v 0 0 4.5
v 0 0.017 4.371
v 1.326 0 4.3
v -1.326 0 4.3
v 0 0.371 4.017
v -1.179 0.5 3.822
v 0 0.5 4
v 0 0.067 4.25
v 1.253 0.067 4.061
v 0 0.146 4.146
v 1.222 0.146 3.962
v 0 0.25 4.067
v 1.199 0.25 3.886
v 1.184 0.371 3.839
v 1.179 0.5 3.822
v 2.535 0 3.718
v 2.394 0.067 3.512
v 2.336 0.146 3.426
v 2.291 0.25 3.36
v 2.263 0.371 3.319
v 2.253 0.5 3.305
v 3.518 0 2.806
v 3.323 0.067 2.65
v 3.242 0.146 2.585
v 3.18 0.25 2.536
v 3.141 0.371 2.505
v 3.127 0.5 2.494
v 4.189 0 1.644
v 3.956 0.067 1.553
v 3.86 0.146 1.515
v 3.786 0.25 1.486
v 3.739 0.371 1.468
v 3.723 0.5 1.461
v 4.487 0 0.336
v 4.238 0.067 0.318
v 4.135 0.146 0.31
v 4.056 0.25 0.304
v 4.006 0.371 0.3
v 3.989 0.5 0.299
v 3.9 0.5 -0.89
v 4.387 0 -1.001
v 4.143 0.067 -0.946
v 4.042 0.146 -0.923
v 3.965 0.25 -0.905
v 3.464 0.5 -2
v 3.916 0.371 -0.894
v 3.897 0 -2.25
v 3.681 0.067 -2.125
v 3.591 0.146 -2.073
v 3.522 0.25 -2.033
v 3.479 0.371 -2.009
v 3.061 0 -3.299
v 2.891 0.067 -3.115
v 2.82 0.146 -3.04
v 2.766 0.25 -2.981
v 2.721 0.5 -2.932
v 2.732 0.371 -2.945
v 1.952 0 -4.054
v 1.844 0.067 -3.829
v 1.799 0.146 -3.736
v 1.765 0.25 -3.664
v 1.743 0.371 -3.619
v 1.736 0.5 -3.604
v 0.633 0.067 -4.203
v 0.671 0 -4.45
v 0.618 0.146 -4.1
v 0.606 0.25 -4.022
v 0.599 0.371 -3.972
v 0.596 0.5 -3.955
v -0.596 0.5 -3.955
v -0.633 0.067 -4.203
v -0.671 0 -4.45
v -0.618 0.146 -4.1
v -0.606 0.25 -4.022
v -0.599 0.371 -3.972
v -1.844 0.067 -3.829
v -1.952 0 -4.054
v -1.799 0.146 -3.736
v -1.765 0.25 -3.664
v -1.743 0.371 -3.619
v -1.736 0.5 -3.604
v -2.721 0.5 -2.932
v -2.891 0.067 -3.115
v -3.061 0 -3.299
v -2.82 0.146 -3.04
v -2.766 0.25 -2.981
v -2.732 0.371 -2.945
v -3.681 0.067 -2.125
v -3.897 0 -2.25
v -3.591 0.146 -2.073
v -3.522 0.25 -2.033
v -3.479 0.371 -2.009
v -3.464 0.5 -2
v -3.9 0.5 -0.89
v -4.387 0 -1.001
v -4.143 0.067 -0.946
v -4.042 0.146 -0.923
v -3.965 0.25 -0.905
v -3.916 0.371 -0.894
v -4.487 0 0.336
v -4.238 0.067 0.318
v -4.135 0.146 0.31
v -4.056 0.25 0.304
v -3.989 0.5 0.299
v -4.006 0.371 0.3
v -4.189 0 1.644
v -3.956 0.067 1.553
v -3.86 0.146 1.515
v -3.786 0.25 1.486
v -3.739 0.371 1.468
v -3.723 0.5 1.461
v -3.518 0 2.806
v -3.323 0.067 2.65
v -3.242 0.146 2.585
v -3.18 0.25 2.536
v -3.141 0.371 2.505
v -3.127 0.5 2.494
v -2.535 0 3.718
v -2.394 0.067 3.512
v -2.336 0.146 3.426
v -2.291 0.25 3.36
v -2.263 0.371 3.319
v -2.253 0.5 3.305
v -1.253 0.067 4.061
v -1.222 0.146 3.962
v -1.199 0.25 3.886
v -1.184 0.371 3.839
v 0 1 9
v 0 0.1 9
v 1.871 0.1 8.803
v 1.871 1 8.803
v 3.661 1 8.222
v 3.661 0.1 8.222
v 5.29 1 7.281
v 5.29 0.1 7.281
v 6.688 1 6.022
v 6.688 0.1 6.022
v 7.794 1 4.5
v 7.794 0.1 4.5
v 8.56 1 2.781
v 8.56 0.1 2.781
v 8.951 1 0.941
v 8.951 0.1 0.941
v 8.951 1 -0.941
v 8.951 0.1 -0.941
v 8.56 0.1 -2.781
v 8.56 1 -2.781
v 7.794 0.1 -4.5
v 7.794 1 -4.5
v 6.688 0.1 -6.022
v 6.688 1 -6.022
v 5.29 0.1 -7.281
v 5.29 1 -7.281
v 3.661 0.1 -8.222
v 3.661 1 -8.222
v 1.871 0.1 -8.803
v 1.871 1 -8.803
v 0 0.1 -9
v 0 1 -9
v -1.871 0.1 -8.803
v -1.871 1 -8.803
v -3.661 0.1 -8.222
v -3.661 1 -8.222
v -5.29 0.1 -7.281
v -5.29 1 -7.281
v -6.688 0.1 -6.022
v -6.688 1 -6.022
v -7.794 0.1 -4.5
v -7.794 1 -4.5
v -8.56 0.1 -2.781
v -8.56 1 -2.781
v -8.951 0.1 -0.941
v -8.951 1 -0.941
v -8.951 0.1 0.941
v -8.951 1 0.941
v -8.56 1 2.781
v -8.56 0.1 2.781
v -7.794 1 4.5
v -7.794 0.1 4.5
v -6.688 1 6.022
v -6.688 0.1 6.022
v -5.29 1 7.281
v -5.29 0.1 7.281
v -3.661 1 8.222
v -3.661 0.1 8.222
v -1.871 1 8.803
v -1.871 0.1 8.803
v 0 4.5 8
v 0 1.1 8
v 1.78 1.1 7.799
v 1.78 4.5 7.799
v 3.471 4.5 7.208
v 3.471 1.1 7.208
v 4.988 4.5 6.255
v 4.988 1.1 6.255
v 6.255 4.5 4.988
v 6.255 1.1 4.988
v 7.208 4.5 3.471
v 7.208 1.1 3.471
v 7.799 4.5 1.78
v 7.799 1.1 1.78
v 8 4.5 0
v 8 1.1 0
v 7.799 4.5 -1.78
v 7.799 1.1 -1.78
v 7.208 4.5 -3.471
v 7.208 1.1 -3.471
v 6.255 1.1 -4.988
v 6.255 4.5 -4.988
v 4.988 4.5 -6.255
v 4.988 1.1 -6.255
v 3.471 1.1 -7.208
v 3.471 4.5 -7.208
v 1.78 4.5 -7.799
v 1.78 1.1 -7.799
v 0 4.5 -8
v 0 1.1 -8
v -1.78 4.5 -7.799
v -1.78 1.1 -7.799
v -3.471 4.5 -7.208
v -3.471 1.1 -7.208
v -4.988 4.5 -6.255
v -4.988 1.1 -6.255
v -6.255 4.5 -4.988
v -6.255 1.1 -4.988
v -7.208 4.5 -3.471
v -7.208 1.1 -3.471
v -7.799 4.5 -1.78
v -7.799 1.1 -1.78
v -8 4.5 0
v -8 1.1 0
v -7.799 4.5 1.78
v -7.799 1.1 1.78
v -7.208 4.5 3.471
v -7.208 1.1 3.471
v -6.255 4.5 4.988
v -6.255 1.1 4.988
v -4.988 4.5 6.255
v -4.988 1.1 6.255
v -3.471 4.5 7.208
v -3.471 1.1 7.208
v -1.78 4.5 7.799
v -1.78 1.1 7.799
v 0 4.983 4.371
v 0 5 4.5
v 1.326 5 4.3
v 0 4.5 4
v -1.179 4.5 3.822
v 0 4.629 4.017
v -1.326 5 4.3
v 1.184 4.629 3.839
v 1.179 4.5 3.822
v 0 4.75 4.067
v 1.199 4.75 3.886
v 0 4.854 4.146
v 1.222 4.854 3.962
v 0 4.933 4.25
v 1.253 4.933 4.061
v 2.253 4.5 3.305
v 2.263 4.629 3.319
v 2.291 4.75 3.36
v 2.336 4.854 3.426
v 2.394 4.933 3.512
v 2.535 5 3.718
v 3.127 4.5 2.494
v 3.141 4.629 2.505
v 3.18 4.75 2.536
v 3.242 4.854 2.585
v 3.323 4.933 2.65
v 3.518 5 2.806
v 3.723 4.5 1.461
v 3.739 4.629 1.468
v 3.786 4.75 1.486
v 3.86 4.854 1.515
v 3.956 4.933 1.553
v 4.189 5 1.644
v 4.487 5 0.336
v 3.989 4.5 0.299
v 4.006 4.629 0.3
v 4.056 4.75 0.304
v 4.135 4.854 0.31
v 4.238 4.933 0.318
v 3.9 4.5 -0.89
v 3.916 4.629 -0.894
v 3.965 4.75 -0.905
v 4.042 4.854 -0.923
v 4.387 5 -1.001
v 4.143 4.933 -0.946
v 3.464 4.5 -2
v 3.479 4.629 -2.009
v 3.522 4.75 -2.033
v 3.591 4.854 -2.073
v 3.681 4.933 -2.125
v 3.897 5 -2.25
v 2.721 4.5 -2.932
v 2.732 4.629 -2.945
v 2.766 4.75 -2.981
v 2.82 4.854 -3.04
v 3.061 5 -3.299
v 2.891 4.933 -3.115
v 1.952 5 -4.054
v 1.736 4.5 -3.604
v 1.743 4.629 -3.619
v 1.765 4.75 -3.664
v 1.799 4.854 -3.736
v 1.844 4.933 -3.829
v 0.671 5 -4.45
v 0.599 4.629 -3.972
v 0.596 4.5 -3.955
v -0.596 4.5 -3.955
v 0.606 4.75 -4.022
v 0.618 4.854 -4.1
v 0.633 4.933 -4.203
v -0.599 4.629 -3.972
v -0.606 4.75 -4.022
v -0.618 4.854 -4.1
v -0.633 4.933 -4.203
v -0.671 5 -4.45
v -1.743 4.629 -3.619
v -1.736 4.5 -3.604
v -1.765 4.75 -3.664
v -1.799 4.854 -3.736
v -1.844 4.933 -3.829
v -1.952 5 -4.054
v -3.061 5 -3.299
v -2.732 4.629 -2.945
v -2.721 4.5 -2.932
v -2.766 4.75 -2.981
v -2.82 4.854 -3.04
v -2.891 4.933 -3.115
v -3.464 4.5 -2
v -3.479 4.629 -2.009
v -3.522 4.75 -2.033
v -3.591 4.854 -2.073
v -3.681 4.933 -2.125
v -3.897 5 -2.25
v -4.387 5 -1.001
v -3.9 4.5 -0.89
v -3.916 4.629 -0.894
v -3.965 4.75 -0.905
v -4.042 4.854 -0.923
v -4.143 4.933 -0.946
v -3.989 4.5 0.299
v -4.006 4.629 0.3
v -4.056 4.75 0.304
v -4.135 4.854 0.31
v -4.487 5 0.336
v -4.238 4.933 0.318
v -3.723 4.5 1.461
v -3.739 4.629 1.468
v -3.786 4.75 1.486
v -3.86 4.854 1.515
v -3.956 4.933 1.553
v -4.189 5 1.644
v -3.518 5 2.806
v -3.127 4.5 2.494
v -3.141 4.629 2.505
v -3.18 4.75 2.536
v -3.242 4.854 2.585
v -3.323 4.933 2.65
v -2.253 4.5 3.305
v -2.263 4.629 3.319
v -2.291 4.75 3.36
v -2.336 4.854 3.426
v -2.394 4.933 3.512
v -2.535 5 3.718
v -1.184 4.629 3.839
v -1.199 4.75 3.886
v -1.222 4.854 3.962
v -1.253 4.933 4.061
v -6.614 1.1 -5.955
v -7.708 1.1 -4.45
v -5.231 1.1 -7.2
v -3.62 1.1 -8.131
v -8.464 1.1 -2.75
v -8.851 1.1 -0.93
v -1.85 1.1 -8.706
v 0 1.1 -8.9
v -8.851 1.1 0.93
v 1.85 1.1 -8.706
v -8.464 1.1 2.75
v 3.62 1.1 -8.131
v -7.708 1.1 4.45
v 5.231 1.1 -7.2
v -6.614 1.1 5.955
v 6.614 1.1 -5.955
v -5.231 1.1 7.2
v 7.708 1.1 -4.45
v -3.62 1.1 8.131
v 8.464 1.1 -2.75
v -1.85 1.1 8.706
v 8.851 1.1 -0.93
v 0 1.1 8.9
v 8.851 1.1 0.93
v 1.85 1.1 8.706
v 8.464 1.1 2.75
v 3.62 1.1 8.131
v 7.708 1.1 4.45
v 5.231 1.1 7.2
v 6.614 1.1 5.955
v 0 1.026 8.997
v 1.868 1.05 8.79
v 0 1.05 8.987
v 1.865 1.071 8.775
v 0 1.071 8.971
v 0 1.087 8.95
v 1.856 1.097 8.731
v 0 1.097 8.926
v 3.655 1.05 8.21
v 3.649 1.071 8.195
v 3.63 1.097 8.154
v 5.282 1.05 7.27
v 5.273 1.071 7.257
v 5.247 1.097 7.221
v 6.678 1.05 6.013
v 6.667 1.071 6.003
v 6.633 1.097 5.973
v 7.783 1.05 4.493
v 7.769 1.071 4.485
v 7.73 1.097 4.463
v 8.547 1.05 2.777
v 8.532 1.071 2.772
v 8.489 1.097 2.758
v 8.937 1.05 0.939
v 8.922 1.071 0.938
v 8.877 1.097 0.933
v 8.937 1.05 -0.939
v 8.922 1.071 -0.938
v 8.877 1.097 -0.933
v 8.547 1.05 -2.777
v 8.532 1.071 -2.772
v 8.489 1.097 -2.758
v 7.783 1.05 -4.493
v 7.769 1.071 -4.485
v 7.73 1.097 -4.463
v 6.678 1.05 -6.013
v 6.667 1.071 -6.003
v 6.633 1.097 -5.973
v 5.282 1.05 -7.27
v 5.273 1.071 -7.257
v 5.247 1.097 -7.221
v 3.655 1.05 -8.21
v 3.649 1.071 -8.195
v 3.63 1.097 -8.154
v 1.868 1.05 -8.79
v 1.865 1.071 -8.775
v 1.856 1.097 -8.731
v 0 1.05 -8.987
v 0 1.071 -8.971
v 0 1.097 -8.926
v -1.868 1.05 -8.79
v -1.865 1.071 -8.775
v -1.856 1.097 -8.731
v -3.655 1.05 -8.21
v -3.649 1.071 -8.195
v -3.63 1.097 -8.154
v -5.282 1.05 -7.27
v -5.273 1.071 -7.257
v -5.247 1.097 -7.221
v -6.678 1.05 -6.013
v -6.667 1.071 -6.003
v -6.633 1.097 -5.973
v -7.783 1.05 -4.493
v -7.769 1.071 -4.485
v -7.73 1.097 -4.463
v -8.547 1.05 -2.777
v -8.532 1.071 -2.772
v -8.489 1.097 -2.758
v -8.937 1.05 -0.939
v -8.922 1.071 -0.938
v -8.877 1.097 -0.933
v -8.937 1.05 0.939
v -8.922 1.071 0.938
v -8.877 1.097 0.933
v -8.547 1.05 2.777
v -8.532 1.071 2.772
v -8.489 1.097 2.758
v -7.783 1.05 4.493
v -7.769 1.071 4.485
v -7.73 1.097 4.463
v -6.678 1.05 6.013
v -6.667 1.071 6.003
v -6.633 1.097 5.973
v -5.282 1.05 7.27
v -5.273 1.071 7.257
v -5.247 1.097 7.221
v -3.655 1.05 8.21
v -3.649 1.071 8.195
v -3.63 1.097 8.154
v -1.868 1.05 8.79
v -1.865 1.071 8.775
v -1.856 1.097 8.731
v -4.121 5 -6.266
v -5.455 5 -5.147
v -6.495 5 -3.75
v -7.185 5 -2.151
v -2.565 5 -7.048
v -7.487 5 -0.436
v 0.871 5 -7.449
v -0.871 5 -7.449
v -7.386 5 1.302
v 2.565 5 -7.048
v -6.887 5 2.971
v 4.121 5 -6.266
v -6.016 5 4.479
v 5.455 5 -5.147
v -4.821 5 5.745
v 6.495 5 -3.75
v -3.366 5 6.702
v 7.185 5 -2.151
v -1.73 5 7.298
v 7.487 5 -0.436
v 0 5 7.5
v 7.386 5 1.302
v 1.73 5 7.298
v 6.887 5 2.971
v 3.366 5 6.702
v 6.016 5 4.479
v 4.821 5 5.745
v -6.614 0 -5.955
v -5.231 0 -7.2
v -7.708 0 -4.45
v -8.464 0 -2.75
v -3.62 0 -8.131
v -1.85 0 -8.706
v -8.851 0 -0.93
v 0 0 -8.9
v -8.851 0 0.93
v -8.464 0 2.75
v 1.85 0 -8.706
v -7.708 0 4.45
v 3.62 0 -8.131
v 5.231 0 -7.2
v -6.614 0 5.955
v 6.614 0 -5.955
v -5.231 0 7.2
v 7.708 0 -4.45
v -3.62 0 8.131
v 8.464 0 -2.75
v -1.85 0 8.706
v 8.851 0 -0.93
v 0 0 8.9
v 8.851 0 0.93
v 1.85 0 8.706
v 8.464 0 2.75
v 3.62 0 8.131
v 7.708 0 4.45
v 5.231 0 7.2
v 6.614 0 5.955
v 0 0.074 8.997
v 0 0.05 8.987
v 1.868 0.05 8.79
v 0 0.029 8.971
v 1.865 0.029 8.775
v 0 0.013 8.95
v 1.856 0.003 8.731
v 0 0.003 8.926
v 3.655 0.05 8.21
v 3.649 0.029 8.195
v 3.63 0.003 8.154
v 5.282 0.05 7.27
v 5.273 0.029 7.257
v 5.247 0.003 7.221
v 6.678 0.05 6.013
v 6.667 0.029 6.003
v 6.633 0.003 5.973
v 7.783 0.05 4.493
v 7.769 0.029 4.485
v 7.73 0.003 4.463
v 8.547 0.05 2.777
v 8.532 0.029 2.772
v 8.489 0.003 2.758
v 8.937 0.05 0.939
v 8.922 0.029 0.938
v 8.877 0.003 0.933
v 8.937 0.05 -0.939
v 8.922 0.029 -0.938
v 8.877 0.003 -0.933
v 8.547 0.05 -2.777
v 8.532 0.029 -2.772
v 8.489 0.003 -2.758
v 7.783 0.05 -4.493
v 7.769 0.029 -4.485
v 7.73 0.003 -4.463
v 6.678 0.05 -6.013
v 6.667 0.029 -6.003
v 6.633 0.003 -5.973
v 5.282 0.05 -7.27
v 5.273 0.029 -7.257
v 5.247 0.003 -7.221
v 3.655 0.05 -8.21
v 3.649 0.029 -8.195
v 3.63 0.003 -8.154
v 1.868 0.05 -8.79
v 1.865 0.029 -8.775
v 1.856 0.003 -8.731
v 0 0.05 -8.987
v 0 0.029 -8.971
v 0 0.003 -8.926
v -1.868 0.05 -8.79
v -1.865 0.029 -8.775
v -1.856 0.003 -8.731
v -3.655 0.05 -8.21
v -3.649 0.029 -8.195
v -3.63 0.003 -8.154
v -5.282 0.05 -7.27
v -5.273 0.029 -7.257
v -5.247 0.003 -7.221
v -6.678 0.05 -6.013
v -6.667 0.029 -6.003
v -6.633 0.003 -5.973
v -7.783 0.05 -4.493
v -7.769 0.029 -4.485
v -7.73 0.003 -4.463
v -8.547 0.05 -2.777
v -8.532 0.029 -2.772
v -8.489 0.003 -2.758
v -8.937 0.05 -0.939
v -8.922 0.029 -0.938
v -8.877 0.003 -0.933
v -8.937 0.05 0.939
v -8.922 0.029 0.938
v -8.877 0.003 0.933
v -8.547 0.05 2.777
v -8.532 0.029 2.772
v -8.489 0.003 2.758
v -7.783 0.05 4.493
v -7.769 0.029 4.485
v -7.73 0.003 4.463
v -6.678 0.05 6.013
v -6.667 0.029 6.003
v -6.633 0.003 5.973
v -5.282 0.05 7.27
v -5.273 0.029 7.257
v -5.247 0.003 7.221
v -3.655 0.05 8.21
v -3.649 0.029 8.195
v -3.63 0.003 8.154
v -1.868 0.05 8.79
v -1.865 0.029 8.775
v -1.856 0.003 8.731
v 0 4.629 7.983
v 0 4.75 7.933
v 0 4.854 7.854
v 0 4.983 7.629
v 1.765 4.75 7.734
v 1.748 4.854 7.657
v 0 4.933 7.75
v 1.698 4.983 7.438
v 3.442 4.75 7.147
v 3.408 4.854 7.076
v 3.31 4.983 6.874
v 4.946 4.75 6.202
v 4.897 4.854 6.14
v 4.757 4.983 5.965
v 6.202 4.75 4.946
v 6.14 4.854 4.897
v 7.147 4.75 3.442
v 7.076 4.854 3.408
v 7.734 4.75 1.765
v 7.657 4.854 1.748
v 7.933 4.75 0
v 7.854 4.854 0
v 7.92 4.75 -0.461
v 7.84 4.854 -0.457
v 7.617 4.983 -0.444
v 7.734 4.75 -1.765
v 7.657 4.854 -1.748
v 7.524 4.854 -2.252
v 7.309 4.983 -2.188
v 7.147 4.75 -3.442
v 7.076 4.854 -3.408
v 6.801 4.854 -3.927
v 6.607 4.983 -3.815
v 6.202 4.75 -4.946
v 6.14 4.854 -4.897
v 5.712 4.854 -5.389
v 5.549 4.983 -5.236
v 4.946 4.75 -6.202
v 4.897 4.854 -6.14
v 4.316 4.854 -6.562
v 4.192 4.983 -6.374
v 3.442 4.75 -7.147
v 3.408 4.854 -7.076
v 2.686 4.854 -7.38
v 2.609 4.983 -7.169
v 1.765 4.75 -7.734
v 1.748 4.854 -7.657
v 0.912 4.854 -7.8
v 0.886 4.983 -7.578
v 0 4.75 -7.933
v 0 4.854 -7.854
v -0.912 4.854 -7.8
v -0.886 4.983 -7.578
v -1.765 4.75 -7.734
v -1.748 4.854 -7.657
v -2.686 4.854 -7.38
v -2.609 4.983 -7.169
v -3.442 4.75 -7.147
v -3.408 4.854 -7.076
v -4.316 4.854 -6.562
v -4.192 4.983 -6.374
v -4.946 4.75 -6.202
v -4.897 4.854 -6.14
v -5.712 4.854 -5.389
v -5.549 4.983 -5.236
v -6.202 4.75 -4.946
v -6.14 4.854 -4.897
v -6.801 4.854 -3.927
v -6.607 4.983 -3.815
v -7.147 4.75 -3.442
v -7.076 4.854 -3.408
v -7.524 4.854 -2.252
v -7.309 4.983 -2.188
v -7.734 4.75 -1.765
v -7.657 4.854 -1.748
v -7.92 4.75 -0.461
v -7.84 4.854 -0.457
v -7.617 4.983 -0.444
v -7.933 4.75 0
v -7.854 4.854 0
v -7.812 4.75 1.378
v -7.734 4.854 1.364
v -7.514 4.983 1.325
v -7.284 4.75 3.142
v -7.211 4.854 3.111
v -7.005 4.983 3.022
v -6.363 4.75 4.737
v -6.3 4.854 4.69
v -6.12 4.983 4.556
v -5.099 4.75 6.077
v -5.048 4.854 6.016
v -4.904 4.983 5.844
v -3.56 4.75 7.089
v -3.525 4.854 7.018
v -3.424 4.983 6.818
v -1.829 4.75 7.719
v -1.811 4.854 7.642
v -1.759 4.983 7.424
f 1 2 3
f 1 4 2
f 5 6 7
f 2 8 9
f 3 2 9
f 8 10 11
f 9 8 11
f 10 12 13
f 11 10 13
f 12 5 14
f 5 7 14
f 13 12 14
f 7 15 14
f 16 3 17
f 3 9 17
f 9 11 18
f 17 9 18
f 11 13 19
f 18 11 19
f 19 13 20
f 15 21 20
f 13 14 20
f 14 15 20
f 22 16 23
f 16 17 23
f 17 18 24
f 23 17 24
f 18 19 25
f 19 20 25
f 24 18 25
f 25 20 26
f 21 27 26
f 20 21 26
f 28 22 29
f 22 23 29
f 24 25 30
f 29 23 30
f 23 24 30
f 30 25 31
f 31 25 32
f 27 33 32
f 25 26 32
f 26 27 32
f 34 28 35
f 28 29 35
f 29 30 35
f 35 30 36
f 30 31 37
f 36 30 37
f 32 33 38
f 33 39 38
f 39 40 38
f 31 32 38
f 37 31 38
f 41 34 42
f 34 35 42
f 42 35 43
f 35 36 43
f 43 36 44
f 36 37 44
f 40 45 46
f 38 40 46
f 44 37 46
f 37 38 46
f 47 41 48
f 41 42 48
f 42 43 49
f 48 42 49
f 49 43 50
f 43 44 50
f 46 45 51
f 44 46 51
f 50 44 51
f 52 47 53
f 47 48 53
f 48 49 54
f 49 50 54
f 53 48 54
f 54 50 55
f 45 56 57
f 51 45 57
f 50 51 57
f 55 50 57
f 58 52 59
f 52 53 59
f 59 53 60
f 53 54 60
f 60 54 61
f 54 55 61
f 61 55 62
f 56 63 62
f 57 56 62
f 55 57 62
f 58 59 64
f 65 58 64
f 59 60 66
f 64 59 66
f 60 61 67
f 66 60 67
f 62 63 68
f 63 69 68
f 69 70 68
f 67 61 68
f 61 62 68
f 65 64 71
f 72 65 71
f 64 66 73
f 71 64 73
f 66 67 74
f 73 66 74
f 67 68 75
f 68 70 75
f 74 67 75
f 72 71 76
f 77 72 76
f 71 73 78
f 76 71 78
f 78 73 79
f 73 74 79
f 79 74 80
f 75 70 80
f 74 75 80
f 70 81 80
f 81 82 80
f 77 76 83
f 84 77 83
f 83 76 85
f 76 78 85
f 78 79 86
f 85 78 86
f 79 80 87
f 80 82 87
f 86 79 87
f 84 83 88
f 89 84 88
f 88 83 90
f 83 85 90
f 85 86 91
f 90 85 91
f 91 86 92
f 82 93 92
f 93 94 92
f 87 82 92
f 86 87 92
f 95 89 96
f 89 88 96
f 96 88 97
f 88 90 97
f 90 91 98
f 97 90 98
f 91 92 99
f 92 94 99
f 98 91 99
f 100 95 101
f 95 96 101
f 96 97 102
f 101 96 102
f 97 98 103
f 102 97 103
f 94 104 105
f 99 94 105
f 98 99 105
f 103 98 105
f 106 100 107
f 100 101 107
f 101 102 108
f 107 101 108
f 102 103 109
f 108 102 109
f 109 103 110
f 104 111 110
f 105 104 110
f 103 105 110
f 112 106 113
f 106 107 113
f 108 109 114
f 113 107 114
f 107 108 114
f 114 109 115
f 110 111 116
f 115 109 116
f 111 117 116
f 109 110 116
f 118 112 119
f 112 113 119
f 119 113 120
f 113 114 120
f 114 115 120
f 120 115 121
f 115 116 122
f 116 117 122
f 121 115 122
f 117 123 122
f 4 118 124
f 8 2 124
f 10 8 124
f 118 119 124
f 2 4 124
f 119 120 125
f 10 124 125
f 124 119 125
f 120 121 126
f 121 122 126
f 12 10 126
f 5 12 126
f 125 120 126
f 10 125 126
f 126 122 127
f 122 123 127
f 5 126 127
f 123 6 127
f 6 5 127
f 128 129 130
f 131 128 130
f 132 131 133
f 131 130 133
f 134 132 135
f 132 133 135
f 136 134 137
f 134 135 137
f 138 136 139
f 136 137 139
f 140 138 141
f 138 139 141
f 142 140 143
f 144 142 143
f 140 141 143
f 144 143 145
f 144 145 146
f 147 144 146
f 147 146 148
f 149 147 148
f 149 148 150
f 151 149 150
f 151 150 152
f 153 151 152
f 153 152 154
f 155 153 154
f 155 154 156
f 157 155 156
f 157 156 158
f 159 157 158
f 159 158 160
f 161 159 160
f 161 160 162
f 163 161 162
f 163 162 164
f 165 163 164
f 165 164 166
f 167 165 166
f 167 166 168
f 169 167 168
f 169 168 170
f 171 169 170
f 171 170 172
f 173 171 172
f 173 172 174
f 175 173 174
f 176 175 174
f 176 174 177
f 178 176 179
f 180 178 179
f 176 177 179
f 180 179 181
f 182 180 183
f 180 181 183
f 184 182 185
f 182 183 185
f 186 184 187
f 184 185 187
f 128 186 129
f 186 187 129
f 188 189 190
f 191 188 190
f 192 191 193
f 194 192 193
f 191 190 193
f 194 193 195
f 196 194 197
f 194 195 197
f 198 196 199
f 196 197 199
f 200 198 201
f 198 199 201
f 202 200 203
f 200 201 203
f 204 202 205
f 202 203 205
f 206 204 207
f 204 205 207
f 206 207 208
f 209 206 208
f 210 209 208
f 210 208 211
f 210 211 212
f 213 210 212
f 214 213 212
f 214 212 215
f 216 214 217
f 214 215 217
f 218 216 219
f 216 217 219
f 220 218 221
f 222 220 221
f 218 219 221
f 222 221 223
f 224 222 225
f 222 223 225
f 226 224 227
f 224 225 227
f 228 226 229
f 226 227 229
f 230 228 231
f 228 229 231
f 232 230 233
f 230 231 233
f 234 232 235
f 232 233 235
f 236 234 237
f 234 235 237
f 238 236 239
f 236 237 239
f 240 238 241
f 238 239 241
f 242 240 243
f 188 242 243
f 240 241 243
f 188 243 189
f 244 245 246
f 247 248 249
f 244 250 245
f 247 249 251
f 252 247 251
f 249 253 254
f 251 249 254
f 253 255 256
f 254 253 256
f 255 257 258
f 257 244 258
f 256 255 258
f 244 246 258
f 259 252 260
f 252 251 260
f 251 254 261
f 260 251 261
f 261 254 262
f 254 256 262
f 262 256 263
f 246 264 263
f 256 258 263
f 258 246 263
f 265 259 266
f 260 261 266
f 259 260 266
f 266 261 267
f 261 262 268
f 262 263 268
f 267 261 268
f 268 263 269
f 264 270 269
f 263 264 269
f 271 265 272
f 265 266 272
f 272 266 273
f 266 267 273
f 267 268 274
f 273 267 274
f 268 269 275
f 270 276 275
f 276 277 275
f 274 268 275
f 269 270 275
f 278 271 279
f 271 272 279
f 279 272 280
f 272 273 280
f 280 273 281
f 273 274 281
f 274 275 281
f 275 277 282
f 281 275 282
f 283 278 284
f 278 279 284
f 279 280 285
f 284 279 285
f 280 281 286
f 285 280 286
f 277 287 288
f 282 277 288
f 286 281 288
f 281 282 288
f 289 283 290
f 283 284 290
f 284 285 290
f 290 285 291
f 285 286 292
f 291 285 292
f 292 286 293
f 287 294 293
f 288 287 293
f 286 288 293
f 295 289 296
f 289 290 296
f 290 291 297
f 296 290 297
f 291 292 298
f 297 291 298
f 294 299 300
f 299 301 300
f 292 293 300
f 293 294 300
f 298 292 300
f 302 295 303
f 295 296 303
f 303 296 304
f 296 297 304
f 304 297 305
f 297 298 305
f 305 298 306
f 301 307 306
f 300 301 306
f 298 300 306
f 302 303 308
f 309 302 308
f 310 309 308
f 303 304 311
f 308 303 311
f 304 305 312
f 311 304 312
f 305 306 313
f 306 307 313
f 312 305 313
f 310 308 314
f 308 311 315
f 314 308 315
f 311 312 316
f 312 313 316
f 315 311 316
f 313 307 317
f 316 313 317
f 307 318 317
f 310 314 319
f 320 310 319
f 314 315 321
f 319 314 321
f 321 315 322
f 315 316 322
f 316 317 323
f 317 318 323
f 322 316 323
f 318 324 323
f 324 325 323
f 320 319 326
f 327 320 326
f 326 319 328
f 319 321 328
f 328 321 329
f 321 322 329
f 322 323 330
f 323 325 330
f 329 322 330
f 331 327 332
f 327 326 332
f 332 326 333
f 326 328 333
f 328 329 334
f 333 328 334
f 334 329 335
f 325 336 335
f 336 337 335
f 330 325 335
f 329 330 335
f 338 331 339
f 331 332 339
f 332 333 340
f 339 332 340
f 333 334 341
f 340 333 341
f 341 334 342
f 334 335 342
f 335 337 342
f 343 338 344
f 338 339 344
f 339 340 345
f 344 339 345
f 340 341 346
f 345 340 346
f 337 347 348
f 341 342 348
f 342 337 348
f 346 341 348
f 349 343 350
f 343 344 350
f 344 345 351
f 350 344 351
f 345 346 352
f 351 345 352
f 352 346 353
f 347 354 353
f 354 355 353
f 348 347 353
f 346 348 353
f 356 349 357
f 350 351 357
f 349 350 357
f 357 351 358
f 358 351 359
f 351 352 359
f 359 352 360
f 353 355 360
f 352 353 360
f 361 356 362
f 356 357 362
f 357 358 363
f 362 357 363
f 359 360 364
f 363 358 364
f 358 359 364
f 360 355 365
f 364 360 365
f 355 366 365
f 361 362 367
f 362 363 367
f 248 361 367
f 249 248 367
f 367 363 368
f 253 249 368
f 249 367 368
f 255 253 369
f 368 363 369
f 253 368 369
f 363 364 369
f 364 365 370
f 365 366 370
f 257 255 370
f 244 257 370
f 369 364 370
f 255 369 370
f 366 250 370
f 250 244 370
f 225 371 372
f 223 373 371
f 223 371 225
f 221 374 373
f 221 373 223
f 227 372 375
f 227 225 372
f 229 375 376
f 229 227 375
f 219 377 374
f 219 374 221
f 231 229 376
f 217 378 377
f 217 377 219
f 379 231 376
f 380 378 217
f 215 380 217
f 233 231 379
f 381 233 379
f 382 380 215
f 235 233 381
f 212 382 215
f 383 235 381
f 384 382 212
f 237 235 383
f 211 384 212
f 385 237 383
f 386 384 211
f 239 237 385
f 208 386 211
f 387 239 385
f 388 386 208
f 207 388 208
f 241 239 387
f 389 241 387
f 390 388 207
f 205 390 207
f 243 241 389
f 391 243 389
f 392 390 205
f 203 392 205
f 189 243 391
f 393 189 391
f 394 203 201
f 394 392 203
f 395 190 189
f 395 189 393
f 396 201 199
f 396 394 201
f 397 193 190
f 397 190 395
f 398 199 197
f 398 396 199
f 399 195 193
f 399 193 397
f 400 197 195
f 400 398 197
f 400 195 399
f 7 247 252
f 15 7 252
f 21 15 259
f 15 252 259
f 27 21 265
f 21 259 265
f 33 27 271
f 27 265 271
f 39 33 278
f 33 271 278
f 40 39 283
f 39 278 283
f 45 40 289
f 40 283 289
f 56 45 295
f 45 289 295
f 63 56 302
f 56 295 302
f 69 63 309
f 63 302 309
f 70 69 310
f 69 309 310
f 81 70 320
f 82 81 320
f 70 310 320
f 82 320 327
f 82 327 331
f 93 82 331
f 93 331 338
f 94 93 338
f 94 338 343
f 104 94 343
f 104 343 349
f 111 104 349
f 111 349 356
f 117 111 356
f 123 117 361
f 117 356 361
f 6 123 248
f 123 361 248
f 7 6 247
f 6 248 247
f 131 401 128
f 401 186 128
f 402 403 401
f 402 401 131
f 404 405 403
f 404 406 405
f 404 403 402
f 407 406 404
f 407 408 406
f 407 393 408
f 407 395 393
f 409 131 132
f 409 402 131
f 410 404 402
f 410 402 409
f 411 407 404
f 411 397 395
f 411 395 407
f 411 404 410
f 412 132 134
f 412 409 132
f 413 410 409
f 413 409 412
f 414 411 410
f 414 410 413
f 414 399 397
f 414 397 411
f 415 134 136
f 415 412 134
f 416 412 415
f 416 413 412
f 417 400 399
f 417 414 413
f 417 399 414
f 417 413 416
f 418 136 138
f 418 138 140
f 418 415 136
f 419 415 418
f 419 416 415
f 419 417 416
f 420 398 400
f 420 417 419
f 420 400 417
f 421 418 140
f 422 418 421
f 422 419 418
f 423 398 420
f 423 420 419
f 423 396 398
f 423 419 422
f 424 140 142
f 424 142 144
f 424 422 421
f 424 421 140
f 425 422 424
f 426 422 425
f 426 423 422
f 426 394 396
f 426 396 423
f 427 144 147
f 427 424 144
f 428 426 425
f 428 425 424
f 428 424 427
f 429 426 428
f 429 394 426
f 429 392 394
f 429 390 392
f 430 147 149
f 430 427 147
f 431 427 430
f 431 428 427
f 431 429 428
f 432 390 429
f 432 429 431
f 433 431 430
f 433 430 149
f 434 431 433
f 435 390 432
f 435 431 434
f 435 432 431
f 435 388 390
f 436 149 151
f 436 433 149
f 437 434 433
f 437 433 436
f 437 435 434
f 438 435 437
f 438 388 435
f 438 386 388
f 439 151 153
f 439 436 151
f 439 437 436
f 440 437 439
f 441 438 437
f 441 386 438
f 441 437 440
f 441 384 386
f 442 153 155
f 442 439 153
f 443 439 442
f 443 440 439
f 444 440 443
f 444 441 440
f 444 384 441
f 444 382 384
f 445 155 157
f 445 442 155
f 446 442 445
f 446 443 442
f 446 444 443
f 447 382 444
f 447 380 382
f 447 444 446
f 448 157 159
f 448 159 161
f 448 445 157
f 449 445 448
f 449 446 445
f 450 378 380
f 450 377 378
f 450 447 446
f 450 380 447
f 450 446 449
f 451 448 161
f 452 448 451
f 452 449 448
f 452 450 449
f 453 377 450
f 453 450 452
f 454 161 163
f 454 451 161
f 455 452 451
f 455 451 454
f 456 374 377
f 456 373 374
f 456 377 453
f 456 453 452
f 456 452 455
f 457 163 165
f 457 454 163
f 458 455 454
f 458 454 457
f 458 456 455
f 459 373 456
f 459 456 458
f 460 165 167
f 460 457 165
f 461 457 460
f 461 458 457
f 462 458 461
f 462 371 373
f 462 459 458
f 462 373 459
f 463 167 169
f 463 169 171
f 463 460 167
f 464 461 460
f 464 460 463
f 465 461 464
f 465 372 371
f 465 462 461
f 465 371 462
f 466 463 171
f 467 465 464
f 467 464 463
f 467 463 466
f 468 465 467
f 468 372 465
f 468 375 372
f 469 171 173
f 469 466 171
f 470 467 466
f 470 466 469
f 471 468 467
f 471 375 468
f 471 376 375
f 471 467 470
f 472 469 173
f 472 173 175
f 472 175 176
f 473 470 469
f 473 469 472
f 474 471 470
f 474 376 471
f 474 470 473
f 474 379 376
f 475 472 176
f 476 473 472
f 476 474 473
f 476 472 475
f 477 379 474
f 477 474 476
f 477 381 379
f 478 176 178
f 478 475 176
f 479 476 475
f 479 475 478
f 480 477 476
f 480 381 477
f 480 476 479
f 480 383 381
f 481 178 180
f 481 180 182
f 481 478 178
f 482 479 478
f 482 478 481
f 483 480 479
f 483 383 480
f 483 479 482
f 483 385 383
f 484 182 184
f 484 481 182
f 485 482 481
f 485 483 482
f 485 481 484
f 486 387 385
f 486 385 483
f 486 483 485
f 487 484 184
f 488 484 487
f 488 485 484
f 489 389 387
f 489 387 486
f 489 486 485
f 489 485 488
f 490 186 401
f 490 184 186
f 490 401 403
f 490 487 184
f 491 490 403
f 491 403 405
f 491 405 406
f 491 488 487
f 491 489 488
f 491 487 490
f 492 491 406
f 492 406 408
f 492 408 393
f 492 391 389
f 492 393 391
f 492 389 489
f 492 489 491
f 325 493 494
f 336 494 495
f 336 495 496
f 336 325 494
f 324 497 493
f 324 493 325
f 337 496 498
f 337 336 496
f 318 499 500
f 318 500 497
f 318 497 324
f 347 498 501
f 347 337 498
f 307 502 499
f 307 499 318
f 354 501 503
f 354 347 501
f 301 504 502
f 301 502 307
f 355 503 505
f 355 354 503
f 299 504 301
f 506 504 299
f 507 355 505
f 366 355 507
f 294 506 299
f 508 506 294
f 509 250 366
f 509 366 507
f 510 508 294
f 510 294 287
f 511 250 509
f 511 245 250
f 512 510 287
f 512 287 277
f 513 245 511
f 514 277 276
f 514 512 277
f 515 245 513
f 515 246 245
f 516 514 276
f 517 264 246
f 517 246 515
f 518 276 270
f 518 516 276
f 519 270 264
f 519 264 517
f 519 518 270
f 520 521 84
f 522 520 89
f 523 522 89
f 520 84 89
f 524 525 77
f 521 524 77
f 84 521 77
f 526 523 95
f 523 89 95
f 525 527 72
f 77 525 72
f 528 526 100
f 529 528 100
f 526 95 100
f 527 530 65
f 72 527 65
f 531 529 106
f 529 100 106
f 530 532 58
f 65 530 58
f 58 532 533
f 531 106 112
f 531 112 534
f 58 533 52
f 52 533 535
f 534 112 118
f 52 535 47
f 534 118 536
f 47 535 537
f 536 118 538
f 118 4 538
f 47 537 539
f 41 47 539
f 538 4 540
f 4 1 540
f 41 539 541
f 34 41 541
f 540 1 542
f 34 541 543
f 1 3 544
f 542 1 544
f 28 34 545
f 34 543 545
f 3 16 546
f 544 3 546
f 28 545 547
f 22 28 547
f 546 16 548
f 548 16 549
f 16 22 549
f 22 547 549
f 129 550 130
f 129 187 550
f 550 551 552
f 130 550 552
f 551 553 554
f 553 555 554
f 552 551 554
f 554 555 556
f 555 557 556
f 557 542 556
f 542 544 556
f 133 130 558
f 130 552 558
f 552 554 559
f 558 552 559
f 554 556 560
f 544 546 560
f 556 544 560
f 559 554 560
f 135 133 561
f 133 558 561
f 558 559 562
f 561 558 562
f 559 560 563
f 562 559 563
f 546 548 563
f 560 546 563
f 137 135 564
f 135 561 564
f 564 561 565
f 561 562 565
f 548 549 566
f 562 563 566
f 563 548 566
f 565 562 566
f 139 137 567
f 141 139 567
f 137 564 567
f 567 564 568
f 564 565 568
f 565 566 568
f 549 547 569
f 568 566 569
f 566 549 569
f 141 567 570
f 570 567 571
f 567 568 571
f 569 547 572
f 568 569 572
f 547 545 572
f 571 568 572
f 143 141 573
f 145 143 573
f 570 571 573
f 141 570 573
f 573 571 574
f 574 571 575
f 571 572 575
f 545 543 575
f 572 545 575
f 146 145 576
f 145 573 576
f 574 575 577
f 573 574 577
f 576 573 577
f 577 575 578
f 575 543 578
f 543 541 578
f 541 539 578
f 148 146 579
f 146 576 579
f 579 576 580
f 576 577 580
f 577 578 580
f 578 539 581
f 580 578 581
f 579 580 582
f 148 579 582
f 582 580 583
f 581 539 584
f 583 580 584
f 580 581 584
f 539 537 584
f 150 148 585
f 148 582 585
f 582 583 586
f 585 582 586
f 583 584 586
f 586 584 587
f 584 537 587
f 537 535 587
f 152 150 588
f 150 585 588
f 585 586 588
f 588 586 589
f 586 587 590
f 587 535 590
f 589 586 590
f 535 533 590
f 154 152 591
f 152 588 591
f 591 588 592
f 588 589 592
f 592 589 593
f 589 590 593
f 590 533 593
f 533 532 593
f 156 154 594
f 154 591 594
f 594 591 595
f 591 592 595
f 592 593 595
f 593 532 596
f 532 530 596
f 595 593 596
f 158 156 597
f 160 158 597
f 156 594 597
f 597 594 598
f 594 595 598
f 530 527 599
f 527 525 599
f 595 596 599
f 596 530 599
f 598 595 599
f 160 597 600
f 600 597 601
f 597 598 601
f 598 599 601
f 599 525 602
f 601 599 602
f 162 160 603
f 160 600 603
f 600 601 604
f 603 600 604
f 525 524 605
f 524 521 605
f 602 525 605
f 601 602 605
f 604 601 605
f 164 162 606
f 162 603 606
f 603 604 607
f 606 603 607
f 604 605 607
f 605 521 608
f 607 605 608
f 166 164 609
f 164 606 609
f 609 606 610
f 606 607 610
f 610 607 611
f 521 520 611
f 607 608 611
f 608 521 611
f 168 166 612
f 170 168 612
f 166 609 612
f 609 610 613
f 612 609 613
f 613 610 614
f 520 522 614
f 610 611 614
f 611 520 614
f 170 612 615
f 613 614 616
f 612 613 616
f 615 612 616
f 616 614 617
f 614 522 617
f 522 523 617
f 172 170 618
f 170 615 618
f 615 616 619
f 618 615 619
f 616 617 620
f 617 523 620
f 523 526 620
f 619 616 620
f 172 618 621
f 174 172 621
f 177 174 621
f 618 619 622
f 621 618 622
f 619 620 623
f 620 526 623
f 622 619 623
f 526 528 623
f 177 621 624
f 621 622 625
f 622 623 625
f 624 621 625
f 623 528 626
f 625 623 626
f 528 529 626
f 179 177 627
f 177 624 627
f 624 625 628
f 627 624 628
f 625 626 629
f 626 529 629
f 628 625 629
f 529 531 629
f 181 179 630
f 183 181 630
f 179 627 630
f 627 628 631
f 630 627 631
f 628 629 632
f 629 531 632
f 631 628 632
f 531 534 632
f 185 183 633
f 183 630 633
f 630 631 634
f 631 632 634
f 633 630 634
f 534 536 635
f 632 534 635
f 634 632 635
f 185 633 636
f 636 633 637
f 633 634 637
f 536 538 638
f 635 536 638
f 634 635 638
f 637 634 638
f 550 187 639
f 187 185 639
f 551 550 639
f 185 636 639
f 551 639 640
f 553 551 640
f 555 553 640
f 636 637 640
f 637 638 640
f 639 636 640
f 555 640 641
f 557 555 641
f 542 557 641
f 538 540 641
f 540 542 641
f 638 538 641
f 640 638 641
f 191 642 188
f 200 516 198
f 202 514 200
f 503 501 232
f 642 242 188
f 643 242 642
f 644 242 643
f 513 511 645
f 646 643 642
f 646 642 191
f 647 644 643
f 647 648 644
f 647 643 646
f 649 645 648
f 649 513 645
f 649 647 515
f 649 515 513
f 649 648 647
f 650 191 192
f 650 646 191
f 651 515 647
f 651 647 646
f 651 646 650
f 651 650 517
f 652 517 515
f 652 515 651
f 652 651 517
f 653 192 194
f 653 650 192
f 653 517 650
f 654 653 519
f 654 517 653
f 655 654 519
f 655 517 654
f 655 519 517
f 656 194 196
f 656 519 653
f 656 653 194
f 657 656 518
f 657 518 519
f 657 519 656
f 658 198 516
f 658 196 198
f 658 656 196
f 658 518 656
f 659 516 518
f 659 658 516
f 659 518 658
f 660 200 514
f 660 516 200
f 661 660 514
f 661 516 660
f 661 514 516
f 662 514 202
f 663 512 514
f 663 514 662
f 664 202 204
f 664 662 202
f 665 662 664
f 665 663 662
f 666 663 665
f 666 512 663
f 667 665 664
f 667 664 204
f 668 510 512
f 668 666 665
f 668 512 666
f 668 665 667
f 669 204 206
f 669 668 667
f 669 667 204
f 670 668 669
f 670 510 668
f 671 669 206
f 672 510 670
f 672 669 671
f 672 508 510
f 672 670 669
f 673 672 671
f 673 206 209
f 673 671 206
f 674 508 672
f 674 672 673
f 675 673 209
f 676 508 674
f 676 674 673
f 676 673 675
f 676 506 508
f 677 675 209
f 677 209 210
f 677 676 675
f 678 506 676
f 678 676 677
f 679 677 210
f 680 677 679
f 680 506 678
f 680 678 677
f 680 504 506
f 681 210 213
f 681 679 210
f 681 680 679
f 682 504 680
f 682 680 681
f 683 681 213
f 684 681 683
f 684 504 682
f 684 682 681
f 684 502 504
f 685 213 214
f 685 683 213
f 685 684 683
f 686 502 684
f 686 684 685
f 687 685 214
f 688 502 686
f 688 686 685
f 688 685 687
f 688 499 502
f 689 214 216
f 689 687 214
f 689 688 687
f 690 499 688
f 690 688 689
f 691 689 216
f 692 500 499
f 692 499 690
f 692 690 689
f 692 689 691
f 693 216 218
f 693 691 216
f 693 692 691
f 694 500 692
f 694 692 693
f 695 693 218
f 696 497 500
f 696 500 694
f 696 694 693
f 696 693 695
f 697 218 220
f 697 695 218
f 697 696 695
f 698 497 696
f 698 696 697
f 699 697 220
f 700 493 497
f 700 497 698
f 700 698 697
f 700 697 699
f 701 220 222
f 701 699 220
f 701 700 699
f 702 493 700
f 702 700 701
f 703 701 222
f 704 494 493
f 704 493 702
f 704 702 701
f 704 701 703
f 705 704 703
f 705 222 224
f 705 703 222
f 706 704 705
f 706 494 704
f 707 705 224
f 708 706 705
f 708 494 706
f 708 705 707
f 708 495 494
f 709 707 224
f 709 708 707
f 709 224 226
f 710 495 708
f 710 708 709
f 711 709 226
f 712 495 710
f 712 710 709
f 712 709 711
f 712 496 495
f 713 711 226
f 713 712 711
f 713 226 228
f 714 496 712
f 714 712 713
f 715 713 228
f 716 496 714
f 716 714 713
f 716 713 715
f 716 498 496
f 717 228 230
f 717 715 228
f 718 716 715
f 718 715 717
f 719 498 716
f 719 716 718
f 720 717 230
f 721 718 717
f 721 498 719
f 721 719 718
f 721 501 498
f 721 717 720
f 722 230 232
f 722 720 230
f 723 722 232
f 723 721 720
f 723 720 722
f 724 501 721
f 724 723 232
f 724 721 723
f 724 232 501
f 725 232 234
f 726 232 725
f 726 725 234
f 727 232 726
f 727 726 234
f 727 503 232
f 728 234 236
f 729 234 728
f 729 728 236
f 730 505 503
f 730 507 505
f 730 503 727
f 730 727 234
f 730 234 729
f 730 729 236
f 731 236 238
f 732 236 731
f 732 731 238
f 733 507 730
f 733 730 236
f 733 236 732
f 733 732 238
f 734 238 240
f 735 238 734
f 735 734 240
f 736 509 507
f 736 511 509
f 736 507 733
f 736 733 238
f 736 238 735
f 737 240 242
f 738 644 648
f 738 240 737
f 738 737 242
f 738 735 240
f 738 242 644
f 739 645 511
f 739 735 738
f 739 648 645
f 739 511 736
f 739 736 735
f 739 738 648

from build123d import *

# Parameters (mm, degrees)
SKETCH1_R           = 9
BOSS_EXTRUDE1_DEPTH = 5
CUT_EXTRUDE1_START  = -3.9
SKETCH2_R           = 9
SKETCH2_R_2         = 8
CUT_EXTRUDE1_DEPTH  = 3.9
SKETCH3_R           = 4
CUT_EXTRUDE2_DEPTH  = 5
FILLET1_R           = 0.5
FILLET2_R           = 0.1
FILLET3_R           = 0.1


with BuildPart() as part:
    # Sketch1 → Boss-Extrude1 (new body)
    with BuildSketch(Plane(origin=(0, 0, 0), x_dir=(1, 0, 0), z_dir=(0, 1, 0))):
        with Locations(Location((0, 0, 0), (0, 0, 270))):
            Circle(SKETCH1_R)
    extrude(amount=BOSS_EXTRUDE1_DEPTH)

    # Sketch2 → Cut-Extrude1 (cut)
    with BuildSketch(Plane(origin=(0, 5, 0), x_dir=(1, 0, 0), z_dir=(0, 1, 0)).offset(CUT_EXTRUDE1_START)):
        with Locations(Location((0, 0, 0), (0, 0, 270))):
            Circle(SKETCH2_R)
        with Locations(Location((0, 0, 0), (0, 0, 270))):
            Circle(SKETCH2_R_2, mode=Mode.SUBTRACT)
    extrude(amount=CUT_EXTRUDE1_DEPTH, mode=Mode.SUBTRACT)

    # Sketch3 → Cut-Extrude2 (cut)
    with BuildSketch(Plane(origin=(0, 5, 0), x_dir=(1, 0, 0), z_dir=(0, 1, 0))):
        with Locations(Location((0, 0, 0), (0, 0, 270))):
            Circle(SKETCH3_R)
    extrude(amount=-CUT_EXTRUDE2_DEPTH, mode=Mode.SUBTRACT)

    # Fillet1
    fillet1_edges = [part.edges().sort_by_distance(p)[0] for p in [
        (0, 0, -4),
        (0, 5, -4),
        (0, 5, -8),
    ]]
    fillet(fillet1_edges, radius=FILLET1_R)

    # Fillet2
    fillet2_edges = [part.edges().sort_by_distance(p)[0] for p in [
        (0, 1.1, -9),
    ]]
    fillet(fillet2_edges, radius=FILLET2_R)

    # Fillet3
    fillet3_edges = [part.edges().sort_by_distance(p)[0] for p in [
        (0, 0, -9),
    ]]
    fillet(fillet3_edges, radius=FILLET3_R)


solid = part.part
